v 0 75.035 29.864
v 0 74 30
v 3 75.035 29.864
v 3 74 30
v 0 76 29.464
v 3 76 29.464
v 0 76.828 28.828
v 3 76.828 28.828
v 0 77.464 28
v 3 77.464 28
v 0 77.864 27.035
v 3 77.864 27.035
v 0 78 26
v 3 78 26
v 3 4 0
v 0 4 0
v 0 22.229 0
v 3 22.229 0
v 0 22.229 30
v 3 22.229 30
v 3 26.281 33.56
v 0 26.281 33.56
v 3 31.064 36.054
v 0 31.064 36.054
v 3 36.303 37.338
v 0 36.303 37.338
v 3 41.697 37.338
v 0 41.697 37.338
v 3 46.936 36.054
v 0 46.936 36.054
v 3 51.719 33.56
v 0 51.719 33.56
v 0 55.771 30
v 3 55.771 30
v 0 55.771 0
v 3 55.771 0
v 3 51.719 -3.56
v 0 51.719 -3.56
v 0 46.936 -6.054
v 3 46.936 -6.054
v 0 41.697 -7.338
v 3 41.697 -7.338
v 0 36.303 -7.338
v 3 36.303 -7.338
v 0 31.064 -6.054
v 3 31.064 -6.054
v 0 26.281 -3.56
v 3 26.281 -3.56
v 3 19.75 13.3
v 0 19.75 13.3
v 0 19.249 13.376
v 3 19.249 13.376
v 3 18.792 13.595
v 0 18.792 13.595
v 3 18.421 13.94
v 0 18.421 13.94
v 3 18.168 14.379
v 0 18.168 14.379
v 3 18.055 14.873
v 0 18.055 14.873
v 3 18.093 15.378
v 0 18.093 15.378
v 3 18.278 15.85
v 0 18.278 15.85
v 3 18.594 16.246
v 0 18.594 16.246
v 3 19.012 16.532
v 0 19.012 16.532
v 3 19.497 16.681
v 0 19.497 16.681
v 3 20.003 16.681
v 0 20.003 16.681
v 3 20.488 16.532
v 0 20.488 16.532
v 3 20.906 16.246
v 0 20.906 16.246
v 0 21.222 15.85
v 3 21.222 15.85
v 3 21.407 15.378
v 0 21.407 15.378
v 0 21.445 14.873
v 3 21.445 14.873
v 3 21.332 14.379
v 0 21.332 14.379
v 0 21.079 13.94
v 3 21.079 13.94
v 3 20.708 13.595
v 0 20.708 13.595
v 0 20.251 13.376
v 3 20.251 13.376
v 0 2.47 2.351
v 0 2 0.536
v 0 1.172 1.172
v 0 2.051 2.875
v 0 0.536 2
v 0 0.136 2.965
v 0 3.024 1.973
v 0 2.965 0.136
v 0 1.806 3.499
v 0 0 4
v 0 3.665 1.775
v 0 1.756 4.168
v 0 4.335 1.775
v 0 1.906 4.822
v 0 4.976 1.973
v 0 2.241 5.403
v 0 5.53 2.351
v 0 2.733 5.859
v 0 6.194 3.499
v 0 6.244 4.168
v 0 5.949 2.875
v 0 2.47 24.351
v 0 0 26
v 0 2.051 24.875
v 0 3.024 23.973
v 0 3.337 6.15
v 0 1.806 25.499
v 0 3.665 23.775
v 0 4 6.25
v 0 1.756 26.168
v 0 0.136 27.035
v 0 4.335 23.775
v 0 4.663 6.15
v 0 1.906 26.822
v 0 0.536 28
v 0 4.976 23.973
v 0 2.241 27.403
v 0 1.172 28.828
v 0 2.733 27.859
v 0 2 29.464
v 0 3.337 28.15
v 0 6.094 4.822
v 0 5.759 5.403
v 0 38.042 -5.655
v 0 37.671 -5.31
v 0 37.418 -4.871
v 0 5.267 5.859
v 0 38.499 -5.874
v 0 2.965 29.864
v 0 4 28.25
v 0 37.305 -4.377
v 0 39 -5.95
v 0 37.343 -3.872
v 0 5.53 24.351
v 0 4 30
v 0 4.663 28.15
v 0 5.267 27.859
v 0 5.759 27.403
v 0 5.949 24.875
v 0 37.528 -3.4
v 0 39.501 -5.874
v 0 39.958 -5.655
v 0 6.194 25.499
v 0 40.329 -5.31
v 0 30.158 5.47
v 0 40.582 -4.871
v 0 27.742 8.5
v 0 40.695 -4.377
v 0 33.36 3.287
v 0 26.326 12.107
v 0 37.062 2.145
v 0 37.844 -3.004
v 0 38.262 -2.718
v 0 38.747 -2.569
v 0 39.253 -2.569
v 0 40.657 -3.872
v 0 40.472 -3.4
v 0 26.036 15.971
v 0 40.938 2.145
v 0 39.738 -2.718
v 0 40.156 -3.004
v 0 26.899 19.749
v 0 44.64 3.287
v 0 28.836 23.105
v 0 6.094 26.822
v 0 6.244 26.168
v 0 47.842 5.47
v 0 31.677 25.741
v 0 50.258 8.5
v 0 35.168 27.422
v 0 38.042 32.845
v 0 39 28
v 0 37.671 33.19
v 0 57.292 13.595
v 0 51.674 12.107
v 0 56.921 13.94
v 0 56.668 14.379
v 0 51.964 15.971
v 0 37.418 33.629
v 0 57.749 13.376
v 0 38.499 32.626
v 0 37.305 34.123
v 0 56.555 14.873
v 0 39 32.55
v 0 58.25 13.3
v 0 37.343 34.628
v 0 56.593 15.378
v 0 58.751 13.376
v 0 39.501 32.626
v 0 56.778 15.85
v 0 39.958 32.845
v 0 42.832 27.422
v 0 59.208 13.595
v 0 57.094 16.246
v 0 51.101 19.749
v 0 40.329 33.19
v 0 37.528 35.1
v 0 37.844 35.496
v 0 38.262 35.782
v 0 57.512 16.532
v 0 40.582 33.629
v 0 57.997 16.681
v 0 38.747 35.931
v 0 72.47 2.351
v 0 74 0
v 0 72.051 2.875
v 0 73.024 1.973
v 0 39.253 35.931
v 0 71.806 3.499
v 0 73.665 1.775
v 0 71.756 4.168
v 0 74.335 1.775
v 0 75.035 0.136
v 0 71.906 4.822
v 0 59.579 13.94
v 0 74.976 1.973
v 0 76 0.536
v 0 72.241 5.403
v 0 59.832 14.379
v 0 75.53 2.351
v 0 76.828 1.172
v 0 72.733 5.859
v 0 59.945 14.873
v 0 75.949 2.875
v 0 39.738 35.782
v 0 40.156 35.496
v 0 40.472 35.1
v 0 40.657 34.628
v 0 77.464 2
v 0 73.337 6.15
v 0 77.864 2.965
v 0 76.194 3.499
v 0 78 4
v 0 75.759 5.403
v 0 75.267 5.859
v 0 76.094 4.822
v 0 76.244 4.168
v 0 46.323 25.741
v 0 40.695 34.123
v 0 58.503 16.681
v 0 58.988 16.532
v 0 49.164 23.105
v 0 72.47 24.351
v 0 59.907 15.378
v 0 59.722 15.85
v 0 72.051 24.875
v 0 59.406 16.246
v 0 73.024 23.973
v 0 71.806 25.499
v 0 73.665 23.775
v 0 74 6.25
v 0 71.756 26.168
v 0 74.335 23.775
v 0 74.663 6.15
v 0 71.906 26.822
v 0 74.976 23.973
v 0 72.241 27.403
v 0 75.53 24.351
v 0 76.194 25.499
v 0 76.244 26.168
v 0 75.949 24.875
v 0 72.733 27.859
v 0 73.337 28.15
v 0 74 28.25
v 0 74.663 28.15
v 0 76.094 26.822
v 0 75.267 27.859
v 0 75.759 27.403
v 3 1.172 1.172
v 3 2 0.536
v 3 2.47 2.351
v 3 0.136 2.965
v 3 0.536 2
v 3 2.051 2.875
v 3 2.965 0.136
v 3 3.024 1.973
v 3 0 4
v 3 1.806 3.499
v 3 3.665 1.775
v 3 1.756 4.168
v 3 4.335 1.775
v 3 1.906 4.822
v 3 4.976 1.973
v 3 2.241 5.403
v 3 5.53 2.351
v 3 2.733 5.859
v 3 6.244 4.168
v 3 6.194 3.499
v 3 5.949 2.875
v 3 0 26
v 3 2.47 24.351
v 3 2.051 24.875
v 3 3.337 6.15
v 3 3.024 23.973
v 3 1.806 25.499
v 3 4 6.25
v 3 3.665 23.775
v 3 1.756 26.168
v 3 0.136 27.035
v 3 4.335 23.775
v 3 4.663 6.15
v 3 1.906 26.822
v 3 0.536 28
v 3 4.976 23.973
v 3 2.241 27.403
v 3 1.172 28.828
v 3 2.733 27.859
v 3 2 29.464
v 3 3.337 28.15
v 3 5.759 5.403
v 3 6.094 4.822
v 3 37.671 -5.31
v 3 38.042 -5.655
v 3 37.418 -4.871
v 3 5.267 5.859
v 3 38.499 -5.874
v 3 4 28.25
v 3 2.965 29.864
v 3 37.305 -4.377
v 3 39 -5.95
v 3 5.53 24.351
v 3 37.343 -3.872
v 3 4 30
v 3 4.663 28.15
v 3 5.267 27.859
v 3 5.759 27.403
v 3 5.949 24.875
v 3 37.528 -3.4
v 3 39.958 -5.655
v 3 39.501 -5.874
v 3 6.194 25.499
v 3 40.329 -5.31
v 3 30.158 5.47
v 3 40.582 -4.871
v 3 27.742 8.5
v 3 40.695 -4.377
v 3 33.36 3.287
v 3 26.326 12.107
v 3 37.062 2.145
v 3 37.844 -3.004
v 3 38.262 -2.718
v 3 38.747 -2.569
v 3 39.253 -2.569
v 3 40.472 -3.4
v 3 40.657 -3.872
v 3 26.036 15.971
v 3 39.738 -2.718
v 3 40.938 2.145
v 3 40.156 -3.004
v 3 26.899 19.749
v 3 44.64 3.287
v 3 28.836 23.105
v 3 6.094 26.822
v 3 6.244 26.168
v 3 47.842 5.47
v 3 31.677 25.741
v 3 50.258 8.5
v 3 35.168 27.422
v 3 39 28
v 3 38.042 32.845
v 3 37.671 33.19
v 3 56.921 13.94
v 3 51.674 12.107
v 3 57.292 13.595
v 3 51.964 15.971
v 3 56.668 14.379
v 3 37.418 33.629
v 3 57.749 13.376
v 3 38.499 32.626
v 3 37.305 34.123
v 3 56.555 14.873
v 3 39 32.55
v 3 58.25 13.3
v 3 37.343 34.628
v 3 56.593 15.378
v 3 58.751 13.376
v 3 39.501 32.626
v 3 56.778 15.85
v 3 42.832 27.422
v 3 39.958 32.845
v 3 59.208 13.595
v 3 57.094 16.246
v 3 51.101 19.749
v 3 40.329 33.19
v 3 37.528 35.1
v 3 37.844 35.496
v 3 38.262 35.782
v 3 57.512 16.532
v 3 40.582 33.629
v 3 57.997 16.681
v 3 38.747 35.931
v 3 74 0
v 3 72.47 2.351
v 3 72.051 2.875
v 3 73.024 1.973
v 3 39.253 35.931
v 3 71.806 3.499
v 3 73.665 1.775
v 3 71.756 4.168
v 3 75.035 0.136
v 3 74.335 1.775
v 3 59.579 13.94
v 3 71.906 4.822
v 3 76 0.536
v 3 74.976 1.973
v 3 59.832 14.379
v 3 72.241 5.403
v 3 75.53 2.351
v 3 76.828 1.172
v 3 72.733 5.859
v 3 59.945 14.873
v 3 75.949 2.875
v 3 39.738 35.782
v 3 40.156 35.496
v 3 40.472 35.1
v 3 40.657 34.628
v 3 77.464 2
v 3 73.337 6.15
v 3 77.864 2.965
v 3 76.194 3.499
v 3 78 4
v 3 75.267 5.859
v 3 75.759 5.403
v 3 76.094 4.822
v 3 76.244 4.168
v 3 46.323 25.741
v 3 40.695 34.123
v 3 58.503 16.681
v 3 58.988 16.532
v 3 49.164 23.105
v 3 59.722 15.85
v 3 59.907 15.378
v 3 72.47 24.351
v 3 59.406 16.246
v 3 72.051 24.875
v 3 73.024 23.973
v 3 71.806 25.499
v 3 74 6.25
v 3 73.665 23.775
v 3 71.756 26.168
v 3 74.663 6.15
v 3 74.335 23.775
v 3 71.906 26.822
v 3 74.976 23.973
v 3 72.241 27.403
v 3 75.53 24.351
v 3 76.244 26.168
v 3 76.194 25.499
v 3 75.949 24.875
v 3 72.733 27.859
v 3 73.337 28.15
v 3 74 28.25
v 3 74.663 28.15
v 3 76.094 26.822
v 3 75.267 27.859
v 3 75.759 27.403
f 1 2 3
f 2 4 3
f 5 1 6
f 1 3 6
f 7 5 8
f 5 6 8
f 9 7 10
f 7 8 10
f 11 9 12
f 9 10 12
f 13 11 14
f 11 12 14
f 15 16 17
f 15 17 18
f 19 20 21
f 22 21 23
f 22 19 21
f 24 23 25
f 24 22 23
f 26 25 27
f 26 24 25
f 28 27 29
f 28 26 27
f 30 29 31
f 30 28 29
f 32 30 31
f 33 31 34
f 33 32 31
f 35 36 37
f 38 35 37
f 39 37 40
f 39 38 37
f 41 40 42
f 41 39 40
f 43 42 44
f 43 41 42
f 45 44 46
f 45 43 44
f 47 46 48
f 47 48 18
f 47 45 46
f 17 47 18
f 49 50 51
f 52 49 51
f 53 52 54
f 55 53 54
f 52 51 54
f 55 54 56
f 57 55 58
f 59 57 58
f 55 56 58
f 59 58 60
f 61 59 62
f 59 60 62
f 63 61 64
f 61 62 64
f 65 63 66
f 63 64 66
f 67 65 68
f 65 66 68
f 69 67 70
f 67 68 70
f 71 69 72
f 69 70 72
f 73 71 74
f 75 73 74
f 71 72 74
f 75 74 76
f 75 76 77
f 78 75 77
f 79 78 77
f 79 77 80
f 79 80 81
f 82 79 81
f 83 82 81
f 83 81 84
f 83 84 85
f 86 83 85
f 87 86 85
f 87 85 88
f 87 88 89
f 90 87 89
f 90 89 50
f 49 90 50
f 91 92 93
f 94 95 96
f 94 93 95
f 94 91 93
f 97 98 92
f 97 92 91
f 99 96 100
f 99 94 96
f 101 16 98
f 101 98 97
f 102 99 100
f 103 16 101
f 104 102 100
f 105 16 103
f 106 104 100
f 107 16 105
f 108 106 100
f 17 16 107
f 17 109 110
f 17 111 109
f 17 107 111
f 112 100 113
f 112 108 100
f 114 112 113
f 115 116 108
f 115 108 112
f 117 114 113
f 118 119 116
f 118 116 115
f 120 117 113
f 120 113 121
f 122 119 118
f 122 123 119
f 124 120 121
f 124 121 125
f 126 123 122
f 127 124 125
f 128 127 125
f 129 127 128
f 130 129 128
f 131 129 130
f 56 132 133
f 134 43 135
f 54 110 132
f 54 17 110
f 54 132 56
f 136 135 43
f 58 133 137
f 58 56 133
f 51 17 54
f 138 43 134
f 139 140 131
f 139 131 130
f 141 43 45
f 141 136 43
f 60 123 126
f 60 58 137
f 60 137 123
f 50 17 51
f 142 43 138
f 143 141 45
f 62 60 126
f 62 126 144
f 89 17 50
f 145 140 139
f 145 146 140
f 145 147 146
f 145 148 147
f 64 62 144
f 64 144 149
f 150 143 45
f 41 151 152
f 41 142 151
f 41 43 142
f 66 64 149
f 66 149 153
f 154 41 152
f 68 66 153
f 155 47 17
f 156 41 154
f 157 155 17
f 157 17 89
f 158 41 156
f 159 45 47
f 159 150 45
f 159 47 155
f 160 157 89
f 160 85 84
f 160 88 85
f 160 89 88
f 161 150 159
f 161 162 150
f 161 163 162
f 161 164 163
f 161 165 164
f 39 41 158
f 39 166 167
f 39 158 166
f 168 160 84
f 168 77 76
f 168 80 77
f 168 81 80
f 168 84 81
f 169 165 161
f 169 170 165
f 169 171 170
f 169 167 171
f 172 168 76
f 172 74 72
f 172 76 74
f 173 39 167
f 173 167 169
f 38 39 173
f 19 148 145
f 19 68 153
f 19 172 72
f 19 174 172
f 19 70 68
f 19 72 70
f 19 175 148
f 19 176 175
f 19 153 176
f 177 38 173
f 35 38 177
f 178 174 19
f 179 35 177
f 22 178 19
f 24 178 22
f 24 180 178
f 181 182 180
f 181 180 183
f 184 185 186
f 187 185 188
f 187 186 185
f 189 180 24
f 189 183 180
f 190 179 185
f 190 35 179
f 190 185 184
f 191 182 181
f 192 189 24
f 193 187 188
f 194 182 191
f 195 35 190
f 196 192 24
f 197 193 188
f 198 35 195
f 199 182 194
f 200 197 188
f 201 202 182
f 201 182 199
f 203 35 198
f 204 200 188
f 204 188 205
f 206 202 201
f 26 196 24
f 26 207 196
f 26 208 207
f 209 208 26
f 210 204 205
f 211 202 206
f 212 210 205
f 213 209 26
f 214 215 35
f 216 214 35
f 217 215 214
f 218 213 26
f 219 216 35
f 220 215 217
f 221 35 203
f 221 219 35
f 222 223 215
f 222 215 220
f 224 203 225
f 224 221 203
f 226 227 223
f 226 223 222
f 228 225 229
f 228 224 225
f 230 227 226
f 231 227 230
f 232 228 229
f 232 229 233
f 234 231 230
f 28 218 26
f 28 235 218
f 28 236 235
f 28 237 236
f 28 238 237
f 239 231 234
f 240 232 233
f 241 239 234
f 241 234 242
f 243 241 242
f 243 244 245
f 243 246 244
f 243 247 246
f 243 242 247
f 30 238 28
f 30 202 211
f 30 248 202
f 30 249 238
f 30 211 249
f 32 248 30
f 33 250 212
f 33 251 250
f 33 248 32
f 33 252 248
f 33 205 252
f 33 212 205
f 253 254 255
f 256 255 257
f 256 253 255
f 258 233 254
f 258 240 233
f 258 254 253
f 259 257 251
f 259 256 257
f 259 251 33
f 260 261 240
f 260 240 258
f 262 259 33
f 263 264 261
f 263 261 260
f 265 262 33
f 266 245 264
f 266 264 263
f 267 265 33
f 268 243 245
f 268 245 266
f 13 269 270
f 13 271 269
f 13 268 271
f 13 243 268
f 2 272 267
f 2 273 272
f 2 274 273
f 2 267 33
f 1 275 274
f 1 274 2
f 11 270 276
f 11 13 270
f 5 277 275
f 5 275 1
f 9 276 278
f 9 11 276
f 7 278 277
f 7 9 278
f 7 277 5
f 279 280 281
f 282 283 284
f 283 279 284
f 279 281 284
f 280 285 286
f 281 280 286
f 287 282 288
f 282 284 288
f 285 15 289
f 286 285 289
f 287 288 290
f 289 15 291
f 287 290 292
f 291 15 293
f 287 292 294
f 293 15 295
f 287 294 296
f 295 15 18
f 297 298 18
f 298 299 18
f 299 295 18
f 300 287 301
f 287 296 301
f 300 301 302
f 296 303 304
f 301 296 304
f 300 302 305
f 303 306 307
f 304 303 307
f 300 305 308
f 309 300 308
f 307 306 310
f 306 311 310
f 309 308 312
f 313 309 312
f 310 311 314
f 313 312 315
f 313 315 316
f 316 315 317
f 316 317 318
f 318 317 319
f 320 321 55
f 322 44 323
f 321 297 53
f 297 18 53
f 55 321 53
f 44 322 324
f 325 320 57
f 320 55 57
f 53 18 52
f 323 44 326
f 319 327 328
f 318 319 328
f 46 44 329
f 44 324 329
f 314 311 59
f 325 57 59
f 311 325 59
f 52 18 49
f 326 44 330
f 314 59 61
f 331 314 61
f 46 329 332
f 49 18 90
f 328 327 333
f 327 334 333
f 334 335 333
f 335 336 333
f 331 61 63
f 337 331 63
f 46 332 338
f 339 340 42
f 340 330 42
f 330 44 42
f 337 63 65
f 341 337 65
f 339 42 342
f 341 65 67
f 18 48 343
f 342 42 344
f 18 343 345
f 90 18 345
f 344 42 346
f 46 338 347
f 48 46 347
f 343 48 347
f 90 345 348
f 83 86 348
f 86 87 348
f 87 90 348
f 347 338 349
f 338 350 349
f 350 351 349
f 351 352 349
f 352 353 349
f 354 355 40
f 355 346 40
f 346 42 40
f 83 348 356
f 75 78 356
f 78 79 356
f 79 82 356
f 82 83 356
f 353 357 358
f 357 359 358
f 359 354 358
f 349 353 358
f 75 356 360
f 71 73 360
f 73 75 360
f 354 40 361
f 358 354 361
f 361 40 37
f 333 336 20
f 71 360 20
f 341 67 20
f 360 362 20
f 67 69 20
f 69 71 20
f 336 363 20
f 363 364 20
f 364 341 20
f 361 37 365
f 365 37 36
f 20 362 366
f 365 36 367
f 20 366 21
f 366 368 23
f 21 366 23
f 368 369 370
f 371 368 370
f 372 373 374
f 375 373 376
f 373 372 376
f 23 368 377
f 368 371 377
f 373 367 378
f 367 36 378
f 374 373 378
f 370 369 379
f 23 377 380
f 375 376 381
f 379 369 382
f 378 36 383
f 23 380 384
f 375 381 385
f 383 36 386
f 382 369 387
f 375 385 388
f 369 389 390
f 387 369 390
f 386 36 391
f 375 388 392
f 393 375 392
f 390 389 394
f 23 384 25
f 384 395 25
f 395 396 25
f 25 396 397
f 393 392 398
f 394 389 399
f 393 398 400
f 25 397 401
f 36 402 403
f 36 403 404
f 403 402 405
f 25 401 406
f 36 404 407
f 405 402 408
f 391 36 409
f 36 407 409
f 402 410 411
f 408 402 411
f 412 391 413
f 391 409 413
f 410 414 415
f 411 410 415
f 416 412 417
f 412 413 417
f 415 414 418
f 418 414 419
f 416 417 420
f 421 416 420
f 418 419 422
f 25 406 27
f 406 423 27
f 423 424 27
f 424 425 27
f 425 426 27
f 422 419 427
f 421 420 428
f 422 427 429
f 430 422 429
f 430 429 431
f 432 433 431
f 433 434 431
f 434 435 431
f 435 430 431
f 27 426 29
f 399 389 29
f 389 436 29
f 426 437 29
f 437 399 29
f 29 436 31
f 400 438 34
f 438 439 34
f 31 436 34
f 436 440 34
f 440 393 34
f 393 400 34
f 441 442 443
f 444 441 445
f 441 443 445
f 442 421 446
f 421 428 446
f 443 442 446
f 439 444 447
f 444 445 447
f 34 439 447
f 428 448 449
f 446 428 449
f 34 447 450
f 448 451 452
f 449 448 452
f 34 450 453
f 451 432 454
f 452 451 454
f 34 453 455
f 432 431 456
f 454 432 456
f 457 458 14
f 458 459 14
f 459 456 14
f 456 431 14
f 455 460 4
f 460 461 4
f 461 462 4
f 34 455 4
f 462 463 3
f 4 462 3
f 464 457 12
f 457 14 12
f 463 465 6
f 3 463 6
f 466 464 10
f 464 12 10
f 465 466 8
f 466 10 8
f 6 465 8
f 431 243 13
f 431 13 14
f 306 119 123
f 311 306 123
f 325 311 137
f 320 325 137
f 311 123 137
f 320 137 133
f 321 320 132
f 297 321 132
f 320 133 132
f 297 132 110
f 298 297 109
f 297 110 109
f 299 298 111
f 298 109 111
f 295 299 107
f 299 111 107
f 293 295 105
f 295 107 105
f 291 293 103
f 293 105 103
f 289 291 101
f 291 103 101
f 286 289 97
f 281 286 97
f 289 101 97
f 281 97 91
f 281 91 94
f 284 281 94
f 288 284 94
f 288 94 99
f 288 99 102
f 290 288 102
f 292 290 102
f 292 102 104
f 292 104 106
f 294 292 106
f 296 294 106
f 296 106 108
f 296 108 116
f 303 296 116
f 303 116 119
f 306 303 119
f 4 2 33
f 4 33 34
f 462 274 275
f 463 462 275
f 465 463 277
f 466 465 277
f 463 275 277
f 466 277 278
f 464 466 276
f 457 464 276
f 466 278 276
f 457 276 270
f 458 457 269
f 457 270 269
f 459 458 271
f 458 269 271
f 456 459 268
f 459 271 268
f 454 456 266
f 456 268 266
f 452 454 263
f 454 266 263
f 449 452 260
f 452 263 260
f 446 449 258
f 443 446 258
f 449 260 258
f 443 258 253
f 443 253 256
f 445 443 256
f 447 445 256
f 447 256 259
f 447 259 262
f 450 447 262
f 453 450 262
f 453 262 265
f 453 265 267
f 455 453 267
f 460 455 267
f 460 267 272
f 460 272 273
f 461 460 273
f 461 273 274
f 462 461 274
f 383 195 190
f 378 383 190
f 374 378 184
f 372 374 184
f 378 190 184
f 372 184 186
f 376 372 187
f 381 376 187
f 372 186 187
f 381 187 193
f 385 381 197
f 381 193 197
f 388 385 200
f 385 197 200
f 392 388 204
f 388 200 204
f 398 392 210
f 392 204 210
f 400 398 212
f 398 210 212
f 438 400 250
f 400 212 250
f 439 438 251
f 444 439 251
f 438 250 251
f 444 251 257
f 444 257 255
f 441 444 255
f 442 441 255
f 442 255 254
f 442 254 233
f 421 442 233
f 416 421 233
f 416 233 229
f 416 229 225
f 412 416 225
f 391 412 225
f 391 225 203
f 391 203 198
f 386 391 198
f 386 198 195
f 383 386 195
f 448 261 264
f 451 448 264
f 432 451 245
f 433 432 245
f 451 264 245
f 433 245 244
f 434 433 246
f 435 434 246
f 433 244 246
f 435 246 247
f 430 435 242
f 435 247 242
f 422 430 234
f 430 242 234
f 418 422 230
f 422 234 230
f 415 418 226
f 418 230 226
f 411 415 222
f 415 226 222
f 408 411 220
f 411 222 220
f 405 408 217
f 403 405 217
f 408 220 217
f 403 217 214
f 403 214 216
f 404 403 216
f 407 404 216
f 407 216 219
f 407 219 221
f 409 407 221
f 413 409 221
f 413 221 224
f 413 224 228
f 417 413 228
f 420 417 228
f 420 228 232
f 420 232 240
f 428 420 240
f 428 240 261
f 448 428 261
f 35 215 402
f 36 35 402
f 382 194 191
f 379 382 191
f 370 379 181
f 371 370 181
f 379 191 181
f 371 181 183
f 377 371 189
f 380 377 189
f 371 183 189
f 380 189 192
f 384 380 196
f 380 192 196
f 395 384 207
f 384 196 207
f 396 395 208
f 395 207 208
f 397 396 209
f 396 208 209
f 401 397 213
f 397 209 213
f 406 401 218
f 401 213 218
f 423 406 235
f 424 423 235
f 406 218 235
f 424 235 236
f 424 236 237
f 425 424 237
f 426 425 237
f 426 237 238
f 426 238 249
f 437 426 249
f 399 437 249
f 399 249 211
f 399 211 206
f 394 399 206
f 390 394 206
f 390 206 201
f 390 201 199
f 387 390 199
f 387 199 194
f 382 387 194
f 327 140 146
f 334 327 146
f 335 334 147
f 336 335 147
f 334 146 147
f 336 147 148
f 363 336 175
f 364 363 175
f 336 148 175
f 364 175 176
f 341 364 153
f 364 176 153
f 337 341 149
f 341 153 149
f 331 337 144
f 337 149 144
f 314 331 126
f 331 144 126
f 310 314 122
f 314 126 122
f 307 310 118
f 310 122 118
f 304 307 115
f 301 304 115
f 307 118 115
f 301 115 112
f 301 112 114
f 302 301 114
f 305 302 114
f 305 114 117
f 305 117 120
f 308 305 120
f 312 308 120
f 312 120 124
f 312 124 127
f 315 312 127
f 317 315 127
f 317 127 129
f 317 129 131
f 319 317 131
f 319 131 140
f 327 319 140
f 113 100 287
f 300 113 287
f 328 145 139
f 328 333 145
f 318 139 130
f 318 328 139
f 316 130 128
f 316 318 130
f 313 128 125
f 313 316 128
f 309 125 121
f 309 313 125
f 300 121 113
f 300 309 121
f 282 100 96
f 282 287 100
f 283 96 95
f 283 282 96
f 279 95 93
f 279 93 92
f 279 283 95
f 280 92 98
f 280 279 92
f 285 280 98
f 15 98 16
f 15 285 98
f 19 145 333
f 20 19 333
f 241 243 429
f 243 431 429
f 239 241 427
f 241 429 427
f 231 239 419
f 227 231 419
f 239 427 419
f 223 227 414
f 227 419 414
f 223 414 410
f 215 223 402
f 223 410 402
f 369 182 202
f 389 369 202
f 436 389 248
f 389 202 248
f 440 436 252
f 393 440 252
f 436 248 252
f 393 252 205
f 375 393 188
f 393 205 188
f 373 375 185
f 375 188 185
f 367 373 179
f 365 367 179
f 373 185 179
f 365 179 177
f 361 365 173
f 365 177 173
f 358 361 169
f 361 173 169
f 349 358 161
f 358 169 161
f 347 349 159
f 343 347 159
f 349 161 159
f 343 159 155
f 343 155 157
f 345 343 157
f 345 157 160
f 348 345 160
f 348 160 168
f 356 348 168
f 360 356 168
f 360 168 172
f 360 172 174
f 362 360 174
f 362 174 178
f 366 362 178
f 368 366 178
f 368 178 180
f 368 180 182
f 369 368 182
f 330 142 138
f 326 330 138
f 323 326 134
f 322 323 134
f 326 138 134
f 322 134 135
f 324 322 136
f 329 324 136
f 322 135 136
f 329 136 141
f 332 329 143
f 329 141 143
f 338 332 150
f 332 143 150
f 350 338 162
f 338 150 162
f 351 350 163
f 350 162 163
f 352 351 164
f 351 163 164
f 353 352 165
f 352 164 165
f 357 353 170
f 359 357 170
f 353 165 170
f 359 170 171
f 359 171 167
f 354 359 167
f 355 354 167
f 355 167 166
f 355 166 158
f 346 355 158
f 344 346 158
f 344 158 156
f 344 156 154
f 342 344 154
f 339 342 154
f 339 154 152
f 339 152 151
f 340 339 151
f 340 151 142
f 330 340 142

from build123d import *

# Parameters (mm, degrees)
SKETCH_1_W          = 3
SKETCH_1_H          = 30
EXTRUDE_1_DEPTH     = 78
SKETCH_2_R          = 22.5
EXTRUDE_2_DEPTH     = 3
SKETCH_3_R          = 13
CUT_EXTRUDE_1_DEPTH = 87.598210143
HOLE_WIZARD_M31_D   = 3.4
HOLE_WIZARD_M41_D   = 4.5
FILLET_1_R          = 4


with BuildPart() as part:
    # Эскиз1 → Бобышка-Вытянуть1 (new body)
    with BuildSketch(Plane(origin=(0, 0, 0), x_dir=(1, 0, 0), z_dir=(0, 1, 0))):
        with Locations((1.5, -15)):
            Rectangle(SKETCH_1_W, SKETCH_1_H)
    extrude(amount=EXTRUDE_1_DEPTH)

    # Эскиз2 → Бобышка-Вытянуть2 (add)
    with BuildSketch(Plane.ZY):
        with Locations((15, 39)):
            Circle(SKETCH_2_R)
    extrude(amount=-EXTRUDE_2_DEPTH)

    # Эскиз3 → Вырез-Вытянуть1 (cut, through all)
    with BuildSketch(Plane.ZY):
        with Locations((15, 39)):
            Circle(SKETCH_3_R)
    extrude(amount=-CUT_EXTRUDE_1_DEPTH, mode=Mode.SUBTRACT)

    # Отверстие с зазором M31 (through all)
    with Locations(Plane(origin=(3, -25.024735225, 7.262908886), x_dir=(0, 0, 1), z_dir=(1, 0, 0))):
        with Locations((7.737091114, -83.274735225), (-11.512908886, -64.024735225), (7.737091114, -44.774735225), (26.987091114, -64.024735225)):
            Hole(HOLE_WIZARD_M31_D / 2)

    # Отверстие с зазором M41 (through all)
    with Locations(Plane(origin=(3, 0, 0), x_dir=(0, 0, -1), z_dir=(1, 0, 0))):
        with Locations((-26, 74), (-4, 74), (-4, 4), (-26, 4)):
            Hole(HOLE_WIZARD_M41_D / 2)

    # Скругление1
    fillet_1_edges = [part.edges().sort_by_distance(p)[0] for p in [
        (1.5, 78, 0),
        (1.5, 0, 0),
        (1.5, 0, 30),
        (1.5, 78, 30),
    ]]
    fillet(fillet_1_edges, radius=FILLET_1_R)


solid = part.part
